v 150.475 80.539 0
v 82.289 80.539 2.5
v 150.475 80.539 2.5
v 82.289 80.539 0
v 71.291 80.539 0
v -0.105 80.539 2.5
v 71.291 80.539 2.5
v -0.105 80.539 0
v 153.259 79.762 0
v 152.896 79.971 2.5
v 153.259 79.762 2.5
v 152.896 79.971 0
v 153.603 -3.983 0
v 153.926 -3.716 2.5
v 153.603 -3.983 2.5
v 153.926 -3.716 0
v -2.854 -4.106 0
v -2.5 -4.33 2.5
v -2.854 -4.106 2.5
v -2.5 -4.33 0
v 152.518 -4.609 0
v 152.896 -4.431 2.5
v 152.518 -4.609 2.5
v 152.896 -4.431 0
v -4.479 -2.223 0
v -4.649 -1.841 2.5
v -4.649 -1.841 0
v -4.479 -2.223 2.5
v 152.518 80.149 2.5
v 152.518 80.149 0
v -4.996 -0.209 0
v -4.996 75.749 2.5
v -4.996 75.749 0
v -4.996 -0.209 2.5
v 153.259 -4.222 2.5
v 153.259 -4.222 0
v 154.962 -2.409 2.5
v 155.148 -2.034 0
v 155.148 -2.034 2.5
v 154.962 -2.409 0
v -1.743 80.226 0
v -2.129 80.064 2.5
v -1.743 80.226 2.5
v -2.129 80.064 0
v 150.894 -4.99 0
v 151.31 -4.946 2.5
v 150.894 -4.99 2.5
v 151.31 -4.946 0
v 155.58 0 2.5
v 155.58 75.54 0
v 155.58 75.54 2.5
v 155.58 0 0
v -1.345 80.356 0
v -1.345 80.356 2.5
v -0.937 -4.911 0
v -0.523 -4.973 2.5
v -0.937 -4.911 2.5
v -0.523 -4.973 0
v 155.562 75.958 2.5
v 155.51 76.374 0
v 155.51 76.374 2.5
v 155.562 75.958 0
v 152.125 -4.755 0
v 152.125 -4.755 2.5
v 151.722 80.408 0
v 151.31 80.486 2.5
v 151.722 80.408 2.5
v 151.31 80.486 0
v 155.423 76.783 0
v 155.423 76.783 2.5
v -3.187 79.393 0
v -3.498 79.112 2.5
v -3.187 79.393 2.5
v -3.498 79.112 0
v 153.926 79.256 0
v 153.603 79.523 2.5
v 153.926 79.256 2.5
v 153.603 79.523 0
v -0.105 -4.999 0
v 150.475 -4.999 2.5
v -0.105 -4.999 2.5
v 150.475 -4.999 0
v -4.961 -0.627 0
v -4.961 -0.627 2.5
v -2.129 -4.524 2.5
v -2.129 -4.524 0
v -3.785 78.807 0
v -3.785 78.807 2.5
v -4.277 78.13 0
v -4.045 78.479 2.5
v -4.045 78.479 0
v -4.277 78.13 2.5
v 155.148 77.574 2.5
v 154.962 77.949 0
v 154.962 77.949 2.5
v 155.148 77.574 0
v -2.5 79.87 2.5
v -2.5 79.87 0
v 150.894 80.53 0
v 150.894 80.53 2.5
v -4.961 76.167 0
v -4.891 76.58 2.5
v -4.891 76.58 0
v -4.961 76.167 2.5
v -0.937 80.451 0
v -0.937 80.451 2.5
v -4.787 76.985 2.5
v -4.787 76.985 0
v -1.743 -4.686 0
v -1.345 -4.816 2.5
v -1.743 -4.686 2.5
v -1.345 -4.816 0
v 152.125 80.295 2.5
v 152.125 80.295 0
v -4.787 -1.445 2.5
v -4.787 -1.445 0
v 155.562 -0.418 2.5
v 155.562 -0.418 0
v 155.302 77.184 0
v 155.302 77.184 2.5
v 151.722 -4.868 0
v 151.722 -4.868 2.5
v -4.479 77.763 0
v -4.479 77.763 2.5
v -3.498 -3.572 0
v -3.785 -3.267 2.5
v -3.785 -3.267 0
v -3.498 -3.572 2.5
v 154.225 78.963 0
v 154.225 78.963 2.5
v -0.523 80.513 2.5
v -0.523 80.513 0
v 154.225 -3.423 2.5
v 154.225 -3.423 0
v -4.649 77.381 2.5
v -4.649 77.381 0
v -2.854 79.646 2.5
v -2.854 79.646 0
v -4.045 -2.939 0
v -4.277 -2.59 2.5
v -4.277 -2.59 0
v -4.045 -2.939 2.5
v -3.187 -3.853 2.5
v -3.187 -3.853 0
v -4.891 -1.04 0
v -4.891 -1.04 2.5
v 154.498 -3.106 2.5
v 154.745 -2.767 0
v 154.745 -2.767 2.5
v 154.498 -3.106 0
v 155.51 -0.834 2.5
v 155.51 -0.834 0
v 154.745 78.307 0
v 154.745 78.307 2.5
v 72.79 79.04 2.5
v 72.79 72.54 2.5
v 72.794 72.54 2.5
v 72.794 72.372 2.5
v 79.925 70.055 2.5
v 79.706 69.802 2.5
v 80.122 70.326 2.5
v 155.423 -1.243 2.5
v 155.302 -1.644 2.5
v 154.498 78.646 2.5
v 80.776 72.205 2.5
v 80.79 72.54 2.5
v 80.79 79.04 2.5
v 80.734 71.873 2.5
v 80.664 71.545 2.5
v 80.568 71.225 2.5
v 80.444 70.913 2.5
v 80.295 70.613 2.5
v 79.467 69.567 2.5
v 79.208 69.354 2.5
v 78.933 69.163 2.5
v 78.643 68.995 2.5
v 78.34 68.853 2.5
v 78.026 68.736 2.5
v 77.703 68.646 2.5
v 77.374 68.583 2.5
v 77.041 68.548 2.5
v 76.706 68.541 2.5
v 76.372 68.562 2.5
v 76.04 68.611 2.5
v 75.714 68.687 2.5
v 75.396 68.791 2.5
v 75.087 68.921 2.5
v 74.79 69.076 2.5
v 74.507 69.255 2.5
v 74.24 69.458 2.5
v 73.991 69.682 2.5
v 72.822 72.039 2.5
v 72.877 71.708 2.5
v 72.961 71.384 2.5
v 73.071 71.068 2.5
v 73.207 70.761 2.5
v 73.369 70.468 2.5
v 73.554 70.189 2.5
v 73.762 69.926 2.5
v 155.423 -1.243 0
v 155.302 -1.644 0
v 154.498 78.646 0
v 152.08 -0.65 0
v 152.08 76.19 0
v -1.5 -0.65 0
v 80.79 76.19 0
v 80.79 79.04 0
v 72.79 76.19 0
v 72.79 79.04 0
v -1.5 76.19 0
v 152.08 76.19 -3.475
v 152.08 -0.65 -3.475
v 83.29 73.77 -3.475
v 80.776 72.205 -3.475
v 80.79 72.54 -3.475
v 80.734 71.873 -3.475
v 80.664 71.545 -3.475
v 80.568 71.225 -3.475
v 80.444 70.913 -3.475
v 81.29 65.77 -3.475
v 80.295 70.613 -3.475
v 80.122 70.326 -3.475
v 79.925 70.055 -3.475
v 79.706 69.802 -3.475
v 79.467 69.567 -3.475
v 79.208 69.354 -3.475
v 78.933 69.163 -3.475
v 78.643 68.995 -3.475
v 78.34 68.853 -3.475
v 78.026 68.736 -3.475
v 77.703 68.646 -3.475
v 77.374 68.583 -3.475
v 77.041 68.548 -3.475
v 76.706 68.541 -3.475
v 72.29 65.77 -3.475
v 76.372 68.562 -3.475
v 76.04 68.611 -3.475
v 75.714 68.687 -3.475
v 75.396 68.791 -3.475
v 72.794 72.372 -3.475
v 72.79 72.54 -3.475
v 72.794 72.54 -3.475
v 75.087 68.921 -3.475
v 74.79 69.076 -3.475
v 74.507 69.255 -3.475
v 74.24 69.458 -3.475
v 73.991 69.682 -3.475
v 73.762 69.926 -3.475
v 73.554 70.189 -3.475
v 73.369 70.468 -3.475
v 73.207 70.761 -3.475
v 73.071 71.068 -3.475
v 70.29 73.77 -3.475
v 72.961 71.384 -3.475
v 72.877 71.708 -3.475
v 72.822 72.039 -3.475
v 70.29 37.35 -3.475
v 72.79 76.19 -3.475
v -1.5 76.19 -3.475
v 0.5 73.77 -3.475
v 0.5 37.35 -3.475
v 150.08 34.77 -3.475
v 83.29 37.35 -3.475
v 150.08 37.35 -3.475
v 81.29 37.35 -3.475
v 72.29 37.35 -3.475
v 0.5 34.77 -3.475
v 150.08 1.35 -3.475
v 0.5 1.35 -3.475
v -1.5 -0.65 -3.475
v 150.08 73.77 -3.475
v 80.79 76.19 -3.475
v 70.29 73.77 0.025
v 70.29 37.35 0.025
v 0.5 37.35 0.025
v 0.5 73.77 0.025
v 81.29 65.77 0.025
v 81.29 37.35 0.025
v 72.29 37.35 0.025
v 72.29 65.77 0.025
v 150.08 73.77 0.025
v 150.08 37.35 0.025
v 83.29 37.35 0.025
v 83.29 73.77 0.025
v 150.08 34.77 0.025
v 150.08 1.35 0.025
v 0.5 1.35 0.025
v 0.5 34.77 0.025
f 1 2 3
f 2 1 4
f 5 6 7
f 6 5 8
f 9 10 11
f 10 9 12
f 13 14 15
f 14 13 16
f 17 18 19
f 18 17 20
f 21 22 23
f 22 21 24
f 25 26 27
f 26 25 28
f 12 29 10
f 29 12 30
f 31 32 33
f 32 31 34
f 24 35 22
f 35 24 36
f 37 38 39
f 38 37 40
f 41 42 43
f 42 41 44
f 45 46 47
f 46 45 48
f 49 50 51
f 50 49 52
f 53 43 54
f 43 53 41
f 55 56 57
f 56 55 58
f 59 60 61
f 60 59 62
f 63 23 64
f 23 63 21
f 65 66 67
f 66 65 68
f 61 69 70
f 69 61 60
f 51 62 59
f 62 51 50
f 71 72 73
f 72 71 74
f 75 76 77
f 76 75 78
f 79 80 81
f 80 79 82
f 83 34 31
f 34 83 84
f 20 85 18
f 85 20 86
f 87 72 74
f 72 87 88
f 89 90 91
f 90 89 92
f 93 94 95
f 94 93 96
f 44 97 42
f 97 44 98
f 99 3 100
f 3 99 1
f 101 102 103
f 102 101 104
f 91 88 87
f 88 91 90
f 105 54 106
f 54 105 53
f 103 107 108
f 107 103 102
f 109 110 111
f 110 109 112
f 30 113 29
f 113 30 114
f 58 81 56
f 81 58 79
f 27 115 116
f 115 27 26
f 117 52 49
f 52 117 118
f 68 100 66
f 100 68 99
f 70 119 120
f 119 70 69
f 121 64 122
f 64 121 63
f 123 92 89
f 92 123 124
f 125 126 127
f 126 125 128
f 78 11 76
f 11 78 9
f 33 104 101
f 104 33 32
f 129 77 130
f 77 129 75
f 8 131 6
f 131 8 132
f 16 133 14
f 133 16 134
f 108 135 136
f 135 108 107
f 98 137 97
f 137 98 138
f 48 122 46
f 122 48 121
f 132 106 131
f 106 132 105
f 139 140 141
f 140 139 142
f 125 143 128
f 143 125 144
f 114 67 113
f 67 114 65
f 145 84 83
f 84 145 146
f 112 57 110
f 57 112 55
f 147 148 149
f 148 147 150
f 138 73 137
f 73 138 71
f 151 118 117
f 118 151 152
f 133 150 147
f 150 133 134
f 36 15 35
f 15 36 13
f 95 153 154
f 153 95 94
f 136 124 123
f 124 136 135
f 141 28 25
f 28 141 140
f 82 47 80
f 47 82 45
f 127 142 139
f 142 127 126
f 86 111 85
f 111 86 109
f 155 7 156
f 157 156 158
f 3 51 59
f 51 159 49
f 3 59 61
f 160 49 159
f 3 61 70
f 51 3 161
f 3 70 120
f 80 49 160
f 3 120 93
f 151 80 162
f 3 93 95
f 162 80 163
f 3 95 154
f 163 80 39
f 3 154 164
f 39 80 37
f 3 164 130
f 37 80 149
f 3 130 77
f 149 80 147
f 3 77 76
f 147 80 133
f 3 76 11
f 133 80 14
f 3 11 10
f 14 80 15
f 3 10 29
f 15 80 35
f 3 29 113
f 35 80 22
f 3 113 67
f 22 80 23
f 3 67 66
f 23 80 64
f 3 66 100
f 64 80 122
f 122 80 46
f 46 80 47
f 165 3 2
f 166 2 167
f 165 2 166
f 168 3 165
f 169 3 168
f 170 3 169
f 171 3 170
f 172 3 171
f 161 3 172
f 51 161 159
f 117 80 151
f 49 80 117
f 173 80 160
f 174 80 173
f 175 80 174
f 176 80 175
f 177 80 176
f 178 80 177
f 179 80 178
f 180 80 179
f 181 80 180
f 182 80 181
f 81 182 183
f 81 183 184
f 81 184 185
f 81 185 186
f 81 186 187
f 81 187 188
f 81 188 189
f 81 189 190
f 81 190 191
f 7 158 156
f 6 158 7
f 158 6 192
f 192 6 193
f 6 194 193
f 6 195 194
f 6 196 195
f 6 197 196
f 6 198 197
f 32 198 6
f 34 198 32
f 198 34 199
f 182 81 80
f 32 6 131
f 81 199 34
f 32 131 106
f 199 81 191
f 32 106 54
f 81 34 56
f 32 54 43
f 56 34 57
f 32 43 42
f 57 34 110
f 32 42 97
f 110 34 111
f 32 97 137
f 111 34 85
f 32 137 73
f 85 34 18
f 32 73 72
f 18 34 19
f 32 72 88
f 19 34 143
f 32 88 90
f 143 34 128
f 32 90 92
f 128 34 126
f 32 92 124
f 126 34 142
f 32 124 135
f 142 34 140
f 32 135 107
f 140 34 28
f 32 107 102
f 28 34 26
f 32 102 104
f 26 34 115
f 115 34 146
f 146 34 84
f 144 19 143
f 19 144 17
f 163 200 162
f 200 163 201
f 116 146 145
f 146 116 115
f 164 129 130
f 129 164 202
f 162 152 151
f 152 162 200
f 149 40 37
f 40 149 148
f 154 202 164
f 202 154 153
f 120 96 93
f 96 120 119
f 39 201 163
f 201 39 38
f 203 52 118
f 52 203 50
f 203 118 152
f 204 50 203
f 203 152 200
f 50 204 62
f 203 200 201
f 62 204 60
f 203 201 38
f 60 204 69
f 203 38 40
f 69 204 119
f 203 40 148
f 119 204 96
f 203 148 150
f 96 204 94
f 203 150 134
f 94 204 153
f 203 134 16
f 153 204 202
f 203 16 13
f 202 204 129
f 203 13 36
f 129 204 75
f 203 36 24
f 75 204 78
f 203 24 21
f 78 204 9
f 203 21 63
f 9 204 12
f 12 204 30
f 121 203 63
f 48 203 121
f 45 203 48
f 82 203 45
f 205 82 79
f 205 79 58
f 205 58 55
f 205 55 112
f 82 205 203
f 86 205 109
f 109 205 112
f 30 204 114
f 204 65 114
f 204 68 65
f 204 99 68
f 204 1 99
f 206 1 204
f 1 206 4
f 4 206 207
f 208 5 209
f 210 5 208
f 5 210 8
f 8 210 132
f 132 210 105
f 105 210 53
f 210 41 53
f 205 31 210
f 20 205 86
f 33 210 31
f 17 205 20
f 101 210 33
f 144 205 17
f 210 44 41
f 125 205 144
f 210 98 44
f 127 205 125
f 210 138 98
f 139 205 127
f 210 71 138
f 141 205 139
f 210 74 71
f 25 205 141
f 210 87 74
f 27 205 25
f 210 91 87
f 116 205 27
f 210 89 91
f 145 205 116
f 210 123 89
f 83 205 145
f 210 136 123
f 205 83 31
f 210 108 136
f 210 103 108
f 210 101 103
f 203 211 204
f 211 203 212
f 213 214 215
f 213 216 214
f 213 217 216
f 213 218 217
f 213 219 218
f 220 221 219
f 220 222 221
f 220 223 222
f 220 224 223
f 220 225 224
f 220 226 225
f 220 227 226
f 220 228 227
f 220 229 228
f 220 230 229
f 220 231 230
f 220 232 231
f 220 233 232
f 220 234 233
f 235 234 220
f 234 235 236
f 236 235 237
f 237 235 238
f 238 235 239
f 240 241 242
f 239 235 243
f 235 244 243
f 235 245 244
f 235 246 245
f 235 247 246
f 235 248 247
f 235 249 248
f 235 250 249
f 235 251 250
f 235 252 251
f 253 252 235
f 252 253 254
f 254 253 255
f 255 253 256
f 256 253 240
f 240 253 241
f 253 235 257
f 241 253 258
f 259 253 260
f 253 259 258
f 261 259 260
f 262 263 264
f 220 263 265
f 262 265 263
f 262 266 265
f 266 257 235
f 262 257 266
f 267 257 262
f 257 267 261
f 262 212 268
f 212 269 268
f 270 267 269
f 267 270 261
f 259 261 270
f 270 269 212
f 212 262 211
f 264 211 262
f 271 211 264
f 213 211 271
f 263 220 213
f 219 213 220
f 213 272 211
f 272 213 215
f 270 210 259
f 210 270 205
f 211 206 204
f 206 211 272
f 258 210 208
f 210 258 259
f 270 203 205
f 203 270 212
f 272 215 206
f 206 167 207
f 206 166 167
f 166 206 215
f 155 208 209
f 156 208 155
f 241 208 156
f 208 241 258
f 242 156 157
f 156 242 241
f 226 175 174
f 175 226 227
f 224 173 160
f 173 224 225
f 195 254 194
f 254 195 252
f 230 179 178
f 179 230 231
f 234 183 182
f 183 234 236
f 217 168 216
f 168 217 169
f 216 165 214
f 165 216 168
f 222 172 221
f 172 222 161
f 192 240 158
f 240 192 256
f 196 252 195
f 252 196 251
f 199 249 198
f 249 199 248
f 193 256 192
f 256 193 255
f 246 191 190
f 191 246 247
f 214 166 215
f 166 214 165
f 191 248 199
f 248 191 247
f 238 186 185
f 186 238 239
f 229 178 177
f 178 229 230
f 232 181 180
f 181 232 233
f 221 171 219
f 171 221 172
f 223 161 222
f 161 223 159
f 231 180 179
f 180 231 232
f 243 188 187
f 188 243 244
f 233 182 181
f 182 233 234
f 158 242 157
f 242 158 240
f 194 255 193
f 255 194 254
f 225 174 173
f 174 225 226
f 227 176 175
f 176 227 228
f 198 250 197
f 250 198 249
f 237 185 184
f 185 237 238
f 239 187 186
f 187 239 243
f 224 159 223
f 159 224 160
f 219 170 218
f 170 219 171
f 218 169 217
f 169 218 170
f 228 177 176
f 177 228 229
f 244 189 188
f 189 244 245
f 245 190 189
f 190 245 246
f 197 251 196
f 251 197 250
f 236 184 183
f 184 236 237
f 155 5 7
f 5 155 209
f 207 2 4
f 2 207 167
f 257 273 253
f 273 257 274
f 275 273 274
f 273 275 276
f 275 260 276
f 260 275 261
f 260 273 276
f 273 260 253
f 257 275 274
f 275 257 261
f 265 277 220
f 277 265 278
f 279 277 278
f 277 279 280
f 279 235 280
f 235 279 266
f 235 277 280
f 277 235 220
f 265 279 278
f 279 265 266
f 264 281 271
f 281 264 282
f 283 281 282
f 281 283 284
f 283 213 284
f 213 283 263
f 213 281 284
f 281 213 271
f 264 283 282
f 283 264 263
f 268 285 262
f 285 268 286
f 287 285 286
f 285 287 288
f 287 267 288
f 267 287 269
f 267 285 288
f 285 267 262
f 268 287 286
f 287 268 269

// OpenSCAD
$fn = 75;

shimsAndRelief = 2;     // 1==both, 2==just relief

doFoot = 1;


// micro Tv: buttons = 1, ease = .15, acrylicGrowth = 1.5
// micro Tv: reflector x/y: 87/44 + ease*2+acrylicGrowth
// micro Tv: revlectorD = 10, coreClockD = 22
buttons = 0;    // needs to be redone for micro
ease = .15;
acrylicGrowth = 1.5;
reflectorW = 87 + ease*2 + acrylicGrowth;
reflectorH = 44 + ease*2 + acrylicGrowth;
reflectorD = 10;
clockCoreD = 22; // 18;  7 - 22
cornersReliefR = 1;

// mini frame
// mini Tv: buttons = 1, ease = .15, acrylicGrowth = 1.5
// mini Tv: reflector x/y: 87/44 + ease*2+acrylicGrowth
// mini Tv: revlectorD = 10, coreClockD = 22
bigButtons = 0;     // arcade style (25mm?) buttons at bottom
topButtons = 1;
wallMount = 0;
ease = .15;
acrylicGrowth = 1.5;
reflectorW = 151.78 + ease*2 + acrylicGrowth;
reflectorH = 76.74 + ease*2 + acrylicGrowth;
reflectorD = 12;
clockCoreD = 30; // 22; // 18;  7 - 22
cornersReliefR = 1.2;

coreOffset = [ 0, 0, -.5 ];

acrylicDepth = 3.175 + .3;

footInsetX = 0;
footInsetY = 0.85;

minkowskiR = 5;
wallThickness = 3;

reflectorOffset = [-wallThickness/2, -wallThickness/2, -acrylicDepth];

buttonsH = (30 * bigButtons);
bottomAddtl = (10 * bigButtons);

coreCubeDim = [ reflectorW-wallThickness, reflectorH-wallThickness + buttonsH + bottomAddtl, clockCoreD ];



module arcadeButtonKnub() {
	knubW = 6;
	knubL = 9;
	knubH = 6; // 2.75;
	translate([0, -knubH/2, 0])
		rotate([0, 180 -15, 0])
            cube([knubW, knubH, knubL]);
}

module arcadeButton() {
	coreR = 15.1;
	coreH = 17.2;

	knubOffset = 1;

	ringH = 3.75;
	ringR = (32.88 / 2);
	ringZOffset = -ringH;

	buttonH = 3.75;
	buttonR = (24.75 / 2);
	buttonZOffset = ringZOffset - buttonH;

	cylinder(r=coreR, h=coreH);
	translate([0, 0, ringZOffset])
		cylinder(r=ringR, h=ringH);

	translate([0, 0, buttonZOffset])
		cylinder(r=buttonR, h=buttonH);

	translate([coreR, 0, 10 + knubOffset])
		arcadeButtonKnub();

	rotate([0, 0, 180])
	translate([coreR, 0, 10 + knubOffset])
		arcadeButtonKnub();
}



module reflector(depth = reflectorD) {
    translate(reflectorOffset)
        cube([reflectorW, reflectorH, depth]);
}

//reflectorShimLoc = [0, 0, 0];
aclp = .8;
reflectorShimLoc = [reflectorW/2, acrylicGrowth-1, reflectorD/2+acrylicDepth];
shimPath = [ [ -acrylicGrowth/2, -reflectorD/2+aclp ],
             [ -acrylicGrowth/2+aclp, -reflectorD/2 ],
             [  acrylicGrowth/2+1,  -reflectorD/2 ],
             [  acrylicGrowth/2+1,  reflectorD/2 ],
             [ -acrylicGrowth/2+aclp, reflectorD/2 ],
             [ -acrylicGrowth/2, reflectorD/2-aclp ]
            ];

module reflectorShim(depth = reflectorD) {
*    translate(reflectorShimLoc)
#        cube([reflectorW, acrylicGrowth, depth]);

    translate(reflectorOffset)
    translate(reflectorShimLoc)
    rotate([90, 180, 90])
    linear_extrude(height = reflectorW, center=true)
#        polygon(shimPath);
}

module acrylic(depth = acrylicDepth) {
    translate(reflectorOffset)
           cube([reflectorW, reflectorH, acrylicDepth]);
}

module ledMountSm(d=7) {
    ledSlop = 0.6;      // was .4
    ledMountR = (d + ledSlop) / 2;
    ledMountD = 6.75;
    ledMountBaseR = 7.9 / 2;
    ledMountBaseH = 0.9;
    
    rotate([0, 180, 0])
        union() {
            cylinder(r = ledMountBaseR, h = ledMountBaseH);
            translate([0, 0, -ledMountD]) 
                cylinder(r = ledMountR, h = ledMountD);
        }
}

xbuttonsNegLoc = [ [ 0, 48, 0 ], [ 0, 45, acrylicDepth + 7 ] ];
buttonsNegLoc = [ [ 0, reflectorH + buttonsH - bottomAddtl - 17, 0 ], [ 0, reflectorH + buttonsH - bottomAddtl - 21, acrylicDepth + 16 ] ];
buttonsNegDim = [ [ reflectorW, buttonsH+bottomAddtl-3, 20 ], [ reflectorW, buttonsH + bottomAddtl + 1, 20 ], ];
buttonsNegNum = 1;

xbuttonsLoc = [ [ 15, 55, -5 ], [ reflectorW - 15, 55, -5 ] ];
buttonsLoc = [ [ 30, reflectorH + buttonsH - 9, -2 ], [ reflectorW - 30, reflectorH + buttonsH -9, -2 ] ];
buttonsNum = 1;

topButtonsOffset = [ 0, 0, 22 ];
topButtonsRot = [ 90, 0, 0 ];
topButtonsNum = 1;
topButtonsLoc = [ [ 25, 0, 0 ], [ reflectorW - 25, 0, 0 ] ];

module buttonsNeg() {
    if (bigButtons) {
        translate(reflectorOffset) {
            for (i=[0:1:buttonsNegNum])
                translate(buttonsNegLoc[i])
                    cube(buttonsNegDim[i]);
    
            for (i=[0:1:buttonsNum])
                translate(buttonsLoc[i])
                    arcadeButton();
        }
    }
    if (topButtons) {
        translate(topButtonsOffset) {
/*            
            for (i=[0:1:topButtonsNegNum])
                translate(topButtonsNegLoc[i])
 #                   cube(topButtonsNegDim[i]);
 */
            
            for (i=[0:1:topButtonsNum])
                translate(topButtonsLoc[i])
                    rotate(topButtonsRot)
#                        ledMountSm(12);
        }
    }
}

module baseBlock() {
    translate(coreOffset)
        minkowski()
        {
            cube(coreCubeDim);
            cylinder(r=minkowskiR, h=reflectorD, center=true);
        }
}

module core() {
    difference() {
        baseBlock();
        reflector(reflectorD+acrylicDepth+clockCoreD);
    }
}

retainerRadius = 2;
retainerLoc = [ 0, 0, reflectorD + retainerRadius ];

retainerGap = .5;
retainerGapThrow = 1.7;
retainerGapLoc = [ -6, - retainerGapThrow, reflectorD -.2 ];
retainerGapDim = [ 9, retainerGapThrow, 5 ];

retainerBarLocPos = [ -6, 0, -.65 ];
retainerBarDimPos = [ 6, 1, 1.3 ];
retainerBarLocNeg = [ -6, -1, -.65 - retainerGap ];
retainerBarDimNeg = [ 6, 2.5, 1.3 + 2*retainerGap ];

retainerWeldLoc = [ -.25, 0, -2.4 ];
retainerWeldLoc2 = [ -.25, 0, 2.0 ];
retainerWeldDim = [ .5, 1, .5 ];

module retainerNeg() {
    translate(retainerLoc)
        intersection() {
            union() {
                translate([0, .25, 0])
                sphere(r = retainerRadius+retainerGap);
                translate(retainerBarLocNeg)
                    cube(retainerBarDimNeg);
            }
            translate([-10+retainerRadius+retainerGap,0,-5])
                cube([10,10,10]);
        }
     translate(retainerGapLoc)
        cube(retainerGapDim);
}

module retainerPos() {
    translate(retainerLoc)
        difference() {
            intersection() {
                union() {
                 translate([0, .25, 0])
                   sphere(r = retainerRadius);
                    translate(retainerBarLocPos)
                        cube(retainerBarDimPos);
                    translate(retainerWeldLoc)
   #                     cube(retainerWeldDim);
                    translate(retainerWeldLoc2)
   #                     cube(retainerWeldDim);
                }
                translate([-10+retainerRadius+retainerGap,0,-5])
                    cube([10,2,8]);
            }
        }
}

retainersLoc = [ [ 20, -1.18, -6 ], [ reflectorW - 23, -1.18, -6 ],
                [ 20, reflectorH - .5, -13], [reflectorW - 23, reflectorH - .5, -13],
                [ 20, reflectorH - .5, -6 ], [ reflectorW - 23, reflectorH - .5, -6 ],
//                [ 15, 45.3, -13], [65, 45.3, -13],
];
retainerRot = [ [ 0, 0, 0], [0, 0, 0], 
            [ 0, 0, 180], [0, 0, 180],
            [ 0, 0, 180], [0, 0, 180] ];
retainersNum = 5;

module retainersNeg() {
    if (1 == shimsAndRelief)
    
    for (i=[0:1:retainersNum])
        translate(retainersLoc[i])
            rotate(retainerRot[i])
                retainerNeg();
}

module retainersPos() {
    if (1 == shimsAndRelief)
    for (i=[0:1:retainersNum])
        translate(retainersLoc[i])
            rotate(retainerRot[i])
            retainerPos();
}

module viewPort() {
    viewPortLoc = [ minkowskiR+2, minkowskiR+1.5, -2 ];
    viewPortDim = [ reflectorW-minkowskiR*2-7, reflectorH-minkowskiR*2-7, 2 ];
    translate(viewPortLoc)
        minkowski() {
            cube(viewPortDim);
            cylinder(r=minkowskiR, h=clockCoreD, center=true);
        }
}

cornersReliefH = clockCoreD + acrylicDepth + 2;
    cornersLoc = [ [ -wallThickness/2, 0, cornersReliefH/2 - acrylicDepth ],
                   [ -wallThickness/2, reflectorH  -wallThickness/2, cornersReliefH/2 - acrylicDepth ],
                   [ -wallThickness/2 + reflectorW, 0, cornersReliefH/2 - acrylicDepth ],
                   [ -wallThickness/2 + reflectorW, reflectorH  -wallThickness/2, cornersReliefH/2 - acrylicDepth ] ];
cornerReliefNum = 3;
cornersRot = [ 0, 0, 0 ];

module cornersRelief() {
    for (i=[0:1:cornerReliefNum])
        translate(cornersLoc[i])
            rotate(cornersRot)
#                cylinder(h=cornersReliefH, r=cornersReliefR, center=true);
}

pinFudge = 0.1;
pushPinR1 = 2.25 + pinFudge;
pushPinR2 = 3.9 + pinFudge;
pushPinBarrelH = 5;

pinSpacing = (reflectorW/10);

module mountPos() {
    translate([-wallThickness,-wallThickness,clockCoreD-wallThickness/2]) {    
        for (i=[0:1:4]) {
            difference() {
            translate([(reflectorW/10)*((i*2)+1)+wallThickness/2-pushPinR1-2, 0, -4+pushPinBarrelH])
                cube([pushPinR1*2+4, 10, pushPinBarrelH]);
                
            translate([(reflectorW/10)*((i*2)+1)+wallThickness/2, 6, 2])
                cylinder(r=pushPinR1, h=20, center=true);
            translate([(reflectorW/10)*((i*2)+1)+wallThickness/2-pushPinR1, 6, -4+pushPinBarrelH-.5])
                cube([pushPinR1*2, 10, pushPinBarrelH+1]);
            }
 //       }
     }
    }
}

cableOutR = 4;
cableOutRot = [[ 0, 90, 0], [ 0, 90, 0], [ 90, 0, 0]];
cableOutH = wallThickness * 2;
cableOutL = [ [ -wallThickness*2, reflectorH + (buttonsH + bottomAddtl)/2, clockCoreD+wallThickness+1 ],
              [ reflectorW-wallThickness, reflectorH + (buttonsH + bottomAddtl)/2, clockCoreD+wallThickness+1 ],
              [ (reflectorW-wallThickness)/2, reflectorH + (buttonsH + bottomAddtl)+wallThickness, clockCoreD+wallThickness+1 ] ];
module cableOut() {
    for (i=[0:1:2])
        translate(cableOutL[i])
        rotate(cableOutRot[i])
         cylinder(h=cableOutH,r=cableOutR);
}


footWall = 2;
footH = buttonsH+reflectorH;

module footStep(step) {
    if (step == 1) {        // main lump
        translate([0, 0, -28])
            difference() {
                 translate([0, 0, -5])
                    baseBlock();
  *              core();
                translate([-5, -10, -12])
                    cube([reflectorW+10, footH+15, 40]);      
            }
        translate([footInsetX, footInsetY, 0])
            translate(reflectorOffset)
               cube([reflectorW-2*footInsetX, footH-2*footInsetY, 5]);
    }
    else if (step == 2) {       // cable cutout
        translate([(reflectorW-8)/2, reflectorH+buttonsH-6, -5]) {  // 14
           cube([8, 8, 18]);
            translate([4, 0, 0])
                cylinder(r=4, h=18);
    #        translate([4, 2.5, 0])
                rotate([0, 0, 45])
                    cube([8, 8, 18]);
        }
    }
    else if (step == 3) {       //hollow
        translate(reflectorOffset)
            translate([footInsetX+footWall, footInsetY+footWall, -1.5]) {
                cube([reflectorW-2*footInsetX-2*footWall, (footH-2*footInsetY-2*footWall)/2-3, 5]);
            translate([0, 36 + (buttons*10), 0]) { // [0, 30, 0] for footed
    #           cube([(reflectorW-2*footInsetX-2*footWall)/2-5, (footH-2*footInsetY-2*footWall)/2, 5]);
                translate([(reflectorW-2*footInsetX-2*footWall)/2-3, 0, 0])
                    #           cube([9, (footH-2*footInsetY-2*footWall)/2-8, 5]);
                translate([(reflectorW-2*footInsetX-2*footWall)/2+8, 0, 0])
                    #           cube([(reflectorW-2*footInsetX-2*footWall)/2-8, (footH-2*footInsetY-2*footWall)/2, 5]);

            }
        }
    }
}

module foot() {
    difference() {
        footStep(1);
       footStep(2);
        footStep(3);
    }
}



module doIt() {
    difference() {
        union() {
            core();
        }
        union() {
            if (wallMount)
                retainersNeg();
            viewPort();
#            reflector();
             acrylic();
           buttonsNeg();
            if (shimsAndRelief)
                cornersRelief();
            if (wallMount)
                cableOut();
        }
    }
             if (shimsAndRelief)
                reflectorShim();
   retainersPos();
    if (wallMount)
        mountPos();
}


// middle
// sectL = [ -5, -5, 5 ];
// sectD = [reflectorW*2+10, reflectorW*2+6+10, 2];
// vertical
sectL = [ -5, -8, 23];
sectD = [ 58, 15, 20];

takeSlice = 0;
test = 0;

if (test) {
    reflector();
}
else {
    if (takeSlice) {
        intersection() {
            doIt();
            translate(sectL)
                #cube(sectD);
        }
    }
    else {
        if (doFoot)
            foot();
        else
            doIt();
    }
}
